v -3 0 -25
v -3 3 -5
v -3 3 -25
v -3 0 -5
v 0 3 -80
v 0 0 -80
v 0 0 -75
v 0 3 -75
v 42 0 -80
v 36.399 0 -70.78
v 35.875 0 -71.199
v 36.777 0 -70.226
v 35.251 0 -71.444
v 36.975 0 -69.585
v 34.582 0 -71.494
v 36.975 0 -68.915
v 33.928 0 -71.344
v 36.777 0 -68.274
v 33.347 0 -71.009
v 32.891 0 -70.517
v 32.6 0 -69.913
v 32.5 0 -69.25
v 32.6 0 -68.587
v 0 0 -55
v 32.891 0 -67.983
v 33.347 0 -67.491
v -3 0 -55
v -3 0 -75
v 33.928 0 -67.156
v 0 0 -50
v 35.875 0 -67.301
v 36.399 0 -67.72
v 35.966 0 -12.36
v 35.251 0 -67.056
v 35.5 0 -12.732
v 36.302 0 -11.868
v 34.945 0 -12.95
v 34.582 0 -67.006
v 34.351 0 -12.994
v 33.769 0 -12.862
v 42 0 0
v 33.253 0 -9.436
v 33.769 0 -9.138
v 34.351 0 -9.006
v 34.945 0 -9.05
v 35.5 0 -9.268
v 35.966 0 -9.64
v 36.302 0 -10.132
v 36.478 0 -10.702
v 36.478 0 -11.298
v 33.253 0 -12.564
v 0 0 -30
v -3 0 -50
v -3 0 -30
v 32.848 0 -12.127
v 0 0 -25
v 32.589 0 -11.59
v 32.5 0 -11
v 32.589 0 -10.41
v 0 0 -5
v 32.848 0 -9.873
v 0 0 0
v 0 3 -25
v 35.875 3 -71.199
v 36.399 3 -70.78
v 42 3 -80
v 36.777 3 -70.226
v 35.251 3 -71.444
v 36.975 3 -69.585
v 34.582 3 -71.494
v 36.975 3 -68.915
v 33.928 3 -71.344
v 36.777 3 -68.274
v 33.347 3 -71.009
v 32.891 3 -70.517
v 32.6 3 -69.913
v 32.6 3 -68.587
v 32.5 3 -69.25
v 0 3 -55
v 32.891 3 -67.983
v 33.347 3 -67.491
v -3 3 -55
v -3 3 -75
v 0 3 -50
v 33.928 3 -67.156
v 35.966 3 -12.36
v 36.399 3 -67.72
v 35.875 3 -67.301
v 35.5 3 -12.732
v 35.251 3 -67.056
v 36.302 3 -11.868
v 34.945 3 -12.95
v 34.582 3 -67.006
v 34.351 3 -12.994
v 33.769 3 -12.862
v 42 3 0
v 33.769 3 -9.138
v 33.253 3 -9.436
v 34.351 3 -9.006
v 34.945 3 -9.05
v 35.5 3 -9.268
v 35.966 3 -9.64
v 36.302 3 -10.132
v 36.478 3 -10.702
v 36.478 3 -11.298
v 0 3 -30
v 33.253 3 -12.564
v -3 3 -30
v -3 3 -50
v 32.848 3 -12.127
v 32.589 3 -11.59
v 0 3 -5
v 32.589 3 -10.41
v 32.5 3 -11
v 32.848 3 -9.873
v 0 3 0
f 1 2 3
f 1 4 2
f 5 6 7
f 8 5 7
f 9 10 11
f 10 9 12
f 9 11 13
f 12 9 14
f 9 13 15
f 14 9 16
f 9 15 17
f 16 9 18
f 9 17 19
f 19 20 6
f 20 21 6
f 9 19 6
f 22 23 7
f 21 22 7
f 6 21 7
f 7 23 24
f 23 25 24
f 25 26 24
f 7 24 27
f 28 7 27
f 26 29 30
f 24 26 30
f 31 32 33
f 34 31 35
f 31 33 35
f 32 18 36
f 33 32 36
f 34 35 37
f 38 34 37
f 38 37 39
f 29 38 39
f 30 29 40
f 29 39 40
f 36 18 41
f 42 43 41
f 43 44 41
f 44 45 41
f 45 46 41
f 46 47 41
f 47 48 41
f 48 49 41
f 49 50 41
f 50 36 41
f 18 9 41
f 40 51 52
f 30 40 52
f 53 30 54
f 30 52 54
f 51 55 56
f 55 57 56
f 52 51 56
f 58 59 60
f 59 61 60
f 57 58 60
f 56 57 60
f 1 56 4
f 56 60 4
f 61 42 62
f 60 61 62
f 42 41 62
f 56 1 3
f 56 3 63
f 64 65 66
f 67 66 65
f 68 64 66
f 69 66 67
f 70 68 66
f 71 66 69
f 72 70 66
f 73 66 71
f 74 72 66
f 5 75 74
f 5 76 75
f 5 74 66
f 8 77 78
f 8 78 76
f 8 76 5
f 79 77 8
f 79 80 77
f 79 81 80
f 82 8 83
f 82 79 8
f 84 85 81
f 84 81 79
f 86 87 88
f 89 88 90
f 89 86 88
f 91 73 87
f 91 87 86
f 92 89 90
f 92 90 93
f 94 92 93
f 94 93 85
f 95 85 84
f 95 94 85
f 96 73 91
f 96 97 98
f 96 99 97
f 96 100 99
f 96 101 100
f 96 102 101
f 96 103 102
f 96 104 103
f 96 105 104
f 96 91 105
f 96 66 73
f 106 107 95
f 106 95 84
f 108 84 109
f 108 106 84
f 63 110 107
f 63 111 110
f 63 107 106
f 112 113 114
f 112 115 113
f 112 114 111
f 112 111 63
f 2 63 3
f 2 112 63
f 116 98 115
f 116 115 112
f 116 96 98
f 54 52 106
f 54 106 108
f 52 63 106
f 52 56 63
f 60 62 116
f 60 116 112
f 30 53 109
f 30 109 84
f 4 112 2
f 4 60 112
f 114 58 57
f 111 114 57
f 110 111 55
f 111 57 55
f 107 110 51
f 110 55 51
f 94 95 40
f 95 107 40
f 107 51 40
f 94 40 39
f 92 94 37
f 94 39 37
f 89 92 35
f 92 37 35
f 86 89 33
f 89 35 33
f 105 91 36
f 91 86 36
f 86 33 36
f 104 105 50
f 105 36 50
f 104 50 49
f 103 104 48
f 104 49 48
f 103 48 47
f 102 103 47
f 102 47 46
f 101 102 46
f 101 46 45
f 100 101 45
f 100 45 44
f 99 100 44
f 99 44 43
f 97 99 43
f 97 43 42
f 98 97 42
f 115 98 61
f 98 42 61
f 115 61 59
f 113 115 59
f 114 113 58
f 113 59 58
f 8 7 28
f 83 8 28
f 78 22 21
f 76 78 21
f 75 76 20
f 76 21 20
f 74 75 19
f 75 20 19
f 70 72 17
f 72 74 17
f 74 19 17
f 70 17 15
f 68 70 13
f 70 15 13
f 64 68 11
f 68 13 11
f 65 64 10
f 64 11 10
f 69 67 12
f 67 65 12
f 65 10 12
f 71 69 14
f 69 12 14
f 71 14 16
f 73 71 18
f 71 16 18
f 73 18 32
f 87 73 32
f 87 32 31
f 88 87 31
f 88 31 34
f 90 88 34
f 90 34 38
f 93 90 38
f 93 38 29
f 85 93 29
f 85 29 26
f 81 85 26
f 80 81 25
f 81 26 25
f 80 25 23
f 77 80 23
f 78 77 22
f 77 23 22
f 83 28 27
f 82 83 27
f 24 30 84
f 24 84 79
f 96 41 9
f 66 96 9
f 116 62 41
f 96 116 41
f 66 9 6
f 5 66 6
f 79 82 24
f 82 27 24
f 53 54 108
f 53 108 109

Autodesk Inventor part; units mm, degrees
ref_plane "YZ Plane" through (0, 0, 0) normal (1, 0, 0) x (0, 1, 0)
ref_plane "XZ Plane" through (0, 0, 0) normal (0, 1, 0) x (-1, 0, 0)
ref_plane "XY Plane" through (0, 0, 0) normal (0, 0, 1) x (1, 0, 0)
sketch "Sketch1" plane through (0, 0, 0) normal (0, 1, 0) x (-1, 0, 0)
  line L0 (0, 0) -> (-42, 0)
  line L1 (-42, 0) -> (-42, -80)
  line L2 (-42, -80) -> (0, -80)
  line L3 (0, 0) -> (0, -5)
  line L4 (0, -5) -> (3, -5)
  line L5 (3, -5) -> (3, -25)
  line L6 (3, -25) -> (0, -25)
  line L7 (0, -80) -> (0, -75)
  line L8 (0, -75) -> (3, -75)
  line L9 (3, -75) -> (3, -55)
  line L10 (3, -55) -> (0, -55)
  line L11 (0, -25) -> (0, -30)
  line L12 (0, -30) -> (3, -30)
  line L13 (3, -30) -> (3, -50)
  line L14 (3, -50) -> (0, -50)
  line L15 (0, -50) -> (0, -55)
  line L16 (0, -40) -> (0, -13) construction
  line L17 (0, -13) -> (-32.5, -13) construction
  line L18 (-32.5, -13) -> (-36.5, -13) construction
  line L19 (-36.5, -13) -> (-36.5, -9) construction
  line L20 (-36.5, -9) -> (-32.5, -9) construction
  line L21 (-32.5, -9) -> (-32.5, -13) construction
  circle A0 centre (-34.5, -11) radius 2
  line L22 (-32.5, -13) -> (-32.5, -67) construction
  line L23 (-32.5, -67) -> (-37, -67) construction
  line L24 (-37, -67) -> (-37, -71.5) construction
  line L25 (-37, -71.5) -> (-32.5, -71.5) construction
  line L26 (-32.5, -71.5) -> (-32.5, -67) construction
  circle A1 centre (-34.75, -69.25) radius 2.25
  point P0 (-36.5, -11)
  point P1 (-37, -69.25)
  dimension "d1" = 80
  dimension "d2" = 5
  dimension "d3" = 3
  dimension "d4" = 20
  dimension "d5" = 5
  dimension "d6" = 20
  dimension "d7" = 5
  dimension "d8" = 20
  dimension "d12" = 27
  dimension "d13" = 32.5
  dimension "d14" = 4
  dimension "d15" = 4
  dimension "d16" = 54
  dimension "d17" = 4.5
  dimension "d18" = 4.5
  dimension "d20" = 5
  dimension "d21" = 0
  dimension "d22" = 3
  dimension "d23" = 0
extrude "Extrusion1" add sketch "Sketch1" along normal blind 3
